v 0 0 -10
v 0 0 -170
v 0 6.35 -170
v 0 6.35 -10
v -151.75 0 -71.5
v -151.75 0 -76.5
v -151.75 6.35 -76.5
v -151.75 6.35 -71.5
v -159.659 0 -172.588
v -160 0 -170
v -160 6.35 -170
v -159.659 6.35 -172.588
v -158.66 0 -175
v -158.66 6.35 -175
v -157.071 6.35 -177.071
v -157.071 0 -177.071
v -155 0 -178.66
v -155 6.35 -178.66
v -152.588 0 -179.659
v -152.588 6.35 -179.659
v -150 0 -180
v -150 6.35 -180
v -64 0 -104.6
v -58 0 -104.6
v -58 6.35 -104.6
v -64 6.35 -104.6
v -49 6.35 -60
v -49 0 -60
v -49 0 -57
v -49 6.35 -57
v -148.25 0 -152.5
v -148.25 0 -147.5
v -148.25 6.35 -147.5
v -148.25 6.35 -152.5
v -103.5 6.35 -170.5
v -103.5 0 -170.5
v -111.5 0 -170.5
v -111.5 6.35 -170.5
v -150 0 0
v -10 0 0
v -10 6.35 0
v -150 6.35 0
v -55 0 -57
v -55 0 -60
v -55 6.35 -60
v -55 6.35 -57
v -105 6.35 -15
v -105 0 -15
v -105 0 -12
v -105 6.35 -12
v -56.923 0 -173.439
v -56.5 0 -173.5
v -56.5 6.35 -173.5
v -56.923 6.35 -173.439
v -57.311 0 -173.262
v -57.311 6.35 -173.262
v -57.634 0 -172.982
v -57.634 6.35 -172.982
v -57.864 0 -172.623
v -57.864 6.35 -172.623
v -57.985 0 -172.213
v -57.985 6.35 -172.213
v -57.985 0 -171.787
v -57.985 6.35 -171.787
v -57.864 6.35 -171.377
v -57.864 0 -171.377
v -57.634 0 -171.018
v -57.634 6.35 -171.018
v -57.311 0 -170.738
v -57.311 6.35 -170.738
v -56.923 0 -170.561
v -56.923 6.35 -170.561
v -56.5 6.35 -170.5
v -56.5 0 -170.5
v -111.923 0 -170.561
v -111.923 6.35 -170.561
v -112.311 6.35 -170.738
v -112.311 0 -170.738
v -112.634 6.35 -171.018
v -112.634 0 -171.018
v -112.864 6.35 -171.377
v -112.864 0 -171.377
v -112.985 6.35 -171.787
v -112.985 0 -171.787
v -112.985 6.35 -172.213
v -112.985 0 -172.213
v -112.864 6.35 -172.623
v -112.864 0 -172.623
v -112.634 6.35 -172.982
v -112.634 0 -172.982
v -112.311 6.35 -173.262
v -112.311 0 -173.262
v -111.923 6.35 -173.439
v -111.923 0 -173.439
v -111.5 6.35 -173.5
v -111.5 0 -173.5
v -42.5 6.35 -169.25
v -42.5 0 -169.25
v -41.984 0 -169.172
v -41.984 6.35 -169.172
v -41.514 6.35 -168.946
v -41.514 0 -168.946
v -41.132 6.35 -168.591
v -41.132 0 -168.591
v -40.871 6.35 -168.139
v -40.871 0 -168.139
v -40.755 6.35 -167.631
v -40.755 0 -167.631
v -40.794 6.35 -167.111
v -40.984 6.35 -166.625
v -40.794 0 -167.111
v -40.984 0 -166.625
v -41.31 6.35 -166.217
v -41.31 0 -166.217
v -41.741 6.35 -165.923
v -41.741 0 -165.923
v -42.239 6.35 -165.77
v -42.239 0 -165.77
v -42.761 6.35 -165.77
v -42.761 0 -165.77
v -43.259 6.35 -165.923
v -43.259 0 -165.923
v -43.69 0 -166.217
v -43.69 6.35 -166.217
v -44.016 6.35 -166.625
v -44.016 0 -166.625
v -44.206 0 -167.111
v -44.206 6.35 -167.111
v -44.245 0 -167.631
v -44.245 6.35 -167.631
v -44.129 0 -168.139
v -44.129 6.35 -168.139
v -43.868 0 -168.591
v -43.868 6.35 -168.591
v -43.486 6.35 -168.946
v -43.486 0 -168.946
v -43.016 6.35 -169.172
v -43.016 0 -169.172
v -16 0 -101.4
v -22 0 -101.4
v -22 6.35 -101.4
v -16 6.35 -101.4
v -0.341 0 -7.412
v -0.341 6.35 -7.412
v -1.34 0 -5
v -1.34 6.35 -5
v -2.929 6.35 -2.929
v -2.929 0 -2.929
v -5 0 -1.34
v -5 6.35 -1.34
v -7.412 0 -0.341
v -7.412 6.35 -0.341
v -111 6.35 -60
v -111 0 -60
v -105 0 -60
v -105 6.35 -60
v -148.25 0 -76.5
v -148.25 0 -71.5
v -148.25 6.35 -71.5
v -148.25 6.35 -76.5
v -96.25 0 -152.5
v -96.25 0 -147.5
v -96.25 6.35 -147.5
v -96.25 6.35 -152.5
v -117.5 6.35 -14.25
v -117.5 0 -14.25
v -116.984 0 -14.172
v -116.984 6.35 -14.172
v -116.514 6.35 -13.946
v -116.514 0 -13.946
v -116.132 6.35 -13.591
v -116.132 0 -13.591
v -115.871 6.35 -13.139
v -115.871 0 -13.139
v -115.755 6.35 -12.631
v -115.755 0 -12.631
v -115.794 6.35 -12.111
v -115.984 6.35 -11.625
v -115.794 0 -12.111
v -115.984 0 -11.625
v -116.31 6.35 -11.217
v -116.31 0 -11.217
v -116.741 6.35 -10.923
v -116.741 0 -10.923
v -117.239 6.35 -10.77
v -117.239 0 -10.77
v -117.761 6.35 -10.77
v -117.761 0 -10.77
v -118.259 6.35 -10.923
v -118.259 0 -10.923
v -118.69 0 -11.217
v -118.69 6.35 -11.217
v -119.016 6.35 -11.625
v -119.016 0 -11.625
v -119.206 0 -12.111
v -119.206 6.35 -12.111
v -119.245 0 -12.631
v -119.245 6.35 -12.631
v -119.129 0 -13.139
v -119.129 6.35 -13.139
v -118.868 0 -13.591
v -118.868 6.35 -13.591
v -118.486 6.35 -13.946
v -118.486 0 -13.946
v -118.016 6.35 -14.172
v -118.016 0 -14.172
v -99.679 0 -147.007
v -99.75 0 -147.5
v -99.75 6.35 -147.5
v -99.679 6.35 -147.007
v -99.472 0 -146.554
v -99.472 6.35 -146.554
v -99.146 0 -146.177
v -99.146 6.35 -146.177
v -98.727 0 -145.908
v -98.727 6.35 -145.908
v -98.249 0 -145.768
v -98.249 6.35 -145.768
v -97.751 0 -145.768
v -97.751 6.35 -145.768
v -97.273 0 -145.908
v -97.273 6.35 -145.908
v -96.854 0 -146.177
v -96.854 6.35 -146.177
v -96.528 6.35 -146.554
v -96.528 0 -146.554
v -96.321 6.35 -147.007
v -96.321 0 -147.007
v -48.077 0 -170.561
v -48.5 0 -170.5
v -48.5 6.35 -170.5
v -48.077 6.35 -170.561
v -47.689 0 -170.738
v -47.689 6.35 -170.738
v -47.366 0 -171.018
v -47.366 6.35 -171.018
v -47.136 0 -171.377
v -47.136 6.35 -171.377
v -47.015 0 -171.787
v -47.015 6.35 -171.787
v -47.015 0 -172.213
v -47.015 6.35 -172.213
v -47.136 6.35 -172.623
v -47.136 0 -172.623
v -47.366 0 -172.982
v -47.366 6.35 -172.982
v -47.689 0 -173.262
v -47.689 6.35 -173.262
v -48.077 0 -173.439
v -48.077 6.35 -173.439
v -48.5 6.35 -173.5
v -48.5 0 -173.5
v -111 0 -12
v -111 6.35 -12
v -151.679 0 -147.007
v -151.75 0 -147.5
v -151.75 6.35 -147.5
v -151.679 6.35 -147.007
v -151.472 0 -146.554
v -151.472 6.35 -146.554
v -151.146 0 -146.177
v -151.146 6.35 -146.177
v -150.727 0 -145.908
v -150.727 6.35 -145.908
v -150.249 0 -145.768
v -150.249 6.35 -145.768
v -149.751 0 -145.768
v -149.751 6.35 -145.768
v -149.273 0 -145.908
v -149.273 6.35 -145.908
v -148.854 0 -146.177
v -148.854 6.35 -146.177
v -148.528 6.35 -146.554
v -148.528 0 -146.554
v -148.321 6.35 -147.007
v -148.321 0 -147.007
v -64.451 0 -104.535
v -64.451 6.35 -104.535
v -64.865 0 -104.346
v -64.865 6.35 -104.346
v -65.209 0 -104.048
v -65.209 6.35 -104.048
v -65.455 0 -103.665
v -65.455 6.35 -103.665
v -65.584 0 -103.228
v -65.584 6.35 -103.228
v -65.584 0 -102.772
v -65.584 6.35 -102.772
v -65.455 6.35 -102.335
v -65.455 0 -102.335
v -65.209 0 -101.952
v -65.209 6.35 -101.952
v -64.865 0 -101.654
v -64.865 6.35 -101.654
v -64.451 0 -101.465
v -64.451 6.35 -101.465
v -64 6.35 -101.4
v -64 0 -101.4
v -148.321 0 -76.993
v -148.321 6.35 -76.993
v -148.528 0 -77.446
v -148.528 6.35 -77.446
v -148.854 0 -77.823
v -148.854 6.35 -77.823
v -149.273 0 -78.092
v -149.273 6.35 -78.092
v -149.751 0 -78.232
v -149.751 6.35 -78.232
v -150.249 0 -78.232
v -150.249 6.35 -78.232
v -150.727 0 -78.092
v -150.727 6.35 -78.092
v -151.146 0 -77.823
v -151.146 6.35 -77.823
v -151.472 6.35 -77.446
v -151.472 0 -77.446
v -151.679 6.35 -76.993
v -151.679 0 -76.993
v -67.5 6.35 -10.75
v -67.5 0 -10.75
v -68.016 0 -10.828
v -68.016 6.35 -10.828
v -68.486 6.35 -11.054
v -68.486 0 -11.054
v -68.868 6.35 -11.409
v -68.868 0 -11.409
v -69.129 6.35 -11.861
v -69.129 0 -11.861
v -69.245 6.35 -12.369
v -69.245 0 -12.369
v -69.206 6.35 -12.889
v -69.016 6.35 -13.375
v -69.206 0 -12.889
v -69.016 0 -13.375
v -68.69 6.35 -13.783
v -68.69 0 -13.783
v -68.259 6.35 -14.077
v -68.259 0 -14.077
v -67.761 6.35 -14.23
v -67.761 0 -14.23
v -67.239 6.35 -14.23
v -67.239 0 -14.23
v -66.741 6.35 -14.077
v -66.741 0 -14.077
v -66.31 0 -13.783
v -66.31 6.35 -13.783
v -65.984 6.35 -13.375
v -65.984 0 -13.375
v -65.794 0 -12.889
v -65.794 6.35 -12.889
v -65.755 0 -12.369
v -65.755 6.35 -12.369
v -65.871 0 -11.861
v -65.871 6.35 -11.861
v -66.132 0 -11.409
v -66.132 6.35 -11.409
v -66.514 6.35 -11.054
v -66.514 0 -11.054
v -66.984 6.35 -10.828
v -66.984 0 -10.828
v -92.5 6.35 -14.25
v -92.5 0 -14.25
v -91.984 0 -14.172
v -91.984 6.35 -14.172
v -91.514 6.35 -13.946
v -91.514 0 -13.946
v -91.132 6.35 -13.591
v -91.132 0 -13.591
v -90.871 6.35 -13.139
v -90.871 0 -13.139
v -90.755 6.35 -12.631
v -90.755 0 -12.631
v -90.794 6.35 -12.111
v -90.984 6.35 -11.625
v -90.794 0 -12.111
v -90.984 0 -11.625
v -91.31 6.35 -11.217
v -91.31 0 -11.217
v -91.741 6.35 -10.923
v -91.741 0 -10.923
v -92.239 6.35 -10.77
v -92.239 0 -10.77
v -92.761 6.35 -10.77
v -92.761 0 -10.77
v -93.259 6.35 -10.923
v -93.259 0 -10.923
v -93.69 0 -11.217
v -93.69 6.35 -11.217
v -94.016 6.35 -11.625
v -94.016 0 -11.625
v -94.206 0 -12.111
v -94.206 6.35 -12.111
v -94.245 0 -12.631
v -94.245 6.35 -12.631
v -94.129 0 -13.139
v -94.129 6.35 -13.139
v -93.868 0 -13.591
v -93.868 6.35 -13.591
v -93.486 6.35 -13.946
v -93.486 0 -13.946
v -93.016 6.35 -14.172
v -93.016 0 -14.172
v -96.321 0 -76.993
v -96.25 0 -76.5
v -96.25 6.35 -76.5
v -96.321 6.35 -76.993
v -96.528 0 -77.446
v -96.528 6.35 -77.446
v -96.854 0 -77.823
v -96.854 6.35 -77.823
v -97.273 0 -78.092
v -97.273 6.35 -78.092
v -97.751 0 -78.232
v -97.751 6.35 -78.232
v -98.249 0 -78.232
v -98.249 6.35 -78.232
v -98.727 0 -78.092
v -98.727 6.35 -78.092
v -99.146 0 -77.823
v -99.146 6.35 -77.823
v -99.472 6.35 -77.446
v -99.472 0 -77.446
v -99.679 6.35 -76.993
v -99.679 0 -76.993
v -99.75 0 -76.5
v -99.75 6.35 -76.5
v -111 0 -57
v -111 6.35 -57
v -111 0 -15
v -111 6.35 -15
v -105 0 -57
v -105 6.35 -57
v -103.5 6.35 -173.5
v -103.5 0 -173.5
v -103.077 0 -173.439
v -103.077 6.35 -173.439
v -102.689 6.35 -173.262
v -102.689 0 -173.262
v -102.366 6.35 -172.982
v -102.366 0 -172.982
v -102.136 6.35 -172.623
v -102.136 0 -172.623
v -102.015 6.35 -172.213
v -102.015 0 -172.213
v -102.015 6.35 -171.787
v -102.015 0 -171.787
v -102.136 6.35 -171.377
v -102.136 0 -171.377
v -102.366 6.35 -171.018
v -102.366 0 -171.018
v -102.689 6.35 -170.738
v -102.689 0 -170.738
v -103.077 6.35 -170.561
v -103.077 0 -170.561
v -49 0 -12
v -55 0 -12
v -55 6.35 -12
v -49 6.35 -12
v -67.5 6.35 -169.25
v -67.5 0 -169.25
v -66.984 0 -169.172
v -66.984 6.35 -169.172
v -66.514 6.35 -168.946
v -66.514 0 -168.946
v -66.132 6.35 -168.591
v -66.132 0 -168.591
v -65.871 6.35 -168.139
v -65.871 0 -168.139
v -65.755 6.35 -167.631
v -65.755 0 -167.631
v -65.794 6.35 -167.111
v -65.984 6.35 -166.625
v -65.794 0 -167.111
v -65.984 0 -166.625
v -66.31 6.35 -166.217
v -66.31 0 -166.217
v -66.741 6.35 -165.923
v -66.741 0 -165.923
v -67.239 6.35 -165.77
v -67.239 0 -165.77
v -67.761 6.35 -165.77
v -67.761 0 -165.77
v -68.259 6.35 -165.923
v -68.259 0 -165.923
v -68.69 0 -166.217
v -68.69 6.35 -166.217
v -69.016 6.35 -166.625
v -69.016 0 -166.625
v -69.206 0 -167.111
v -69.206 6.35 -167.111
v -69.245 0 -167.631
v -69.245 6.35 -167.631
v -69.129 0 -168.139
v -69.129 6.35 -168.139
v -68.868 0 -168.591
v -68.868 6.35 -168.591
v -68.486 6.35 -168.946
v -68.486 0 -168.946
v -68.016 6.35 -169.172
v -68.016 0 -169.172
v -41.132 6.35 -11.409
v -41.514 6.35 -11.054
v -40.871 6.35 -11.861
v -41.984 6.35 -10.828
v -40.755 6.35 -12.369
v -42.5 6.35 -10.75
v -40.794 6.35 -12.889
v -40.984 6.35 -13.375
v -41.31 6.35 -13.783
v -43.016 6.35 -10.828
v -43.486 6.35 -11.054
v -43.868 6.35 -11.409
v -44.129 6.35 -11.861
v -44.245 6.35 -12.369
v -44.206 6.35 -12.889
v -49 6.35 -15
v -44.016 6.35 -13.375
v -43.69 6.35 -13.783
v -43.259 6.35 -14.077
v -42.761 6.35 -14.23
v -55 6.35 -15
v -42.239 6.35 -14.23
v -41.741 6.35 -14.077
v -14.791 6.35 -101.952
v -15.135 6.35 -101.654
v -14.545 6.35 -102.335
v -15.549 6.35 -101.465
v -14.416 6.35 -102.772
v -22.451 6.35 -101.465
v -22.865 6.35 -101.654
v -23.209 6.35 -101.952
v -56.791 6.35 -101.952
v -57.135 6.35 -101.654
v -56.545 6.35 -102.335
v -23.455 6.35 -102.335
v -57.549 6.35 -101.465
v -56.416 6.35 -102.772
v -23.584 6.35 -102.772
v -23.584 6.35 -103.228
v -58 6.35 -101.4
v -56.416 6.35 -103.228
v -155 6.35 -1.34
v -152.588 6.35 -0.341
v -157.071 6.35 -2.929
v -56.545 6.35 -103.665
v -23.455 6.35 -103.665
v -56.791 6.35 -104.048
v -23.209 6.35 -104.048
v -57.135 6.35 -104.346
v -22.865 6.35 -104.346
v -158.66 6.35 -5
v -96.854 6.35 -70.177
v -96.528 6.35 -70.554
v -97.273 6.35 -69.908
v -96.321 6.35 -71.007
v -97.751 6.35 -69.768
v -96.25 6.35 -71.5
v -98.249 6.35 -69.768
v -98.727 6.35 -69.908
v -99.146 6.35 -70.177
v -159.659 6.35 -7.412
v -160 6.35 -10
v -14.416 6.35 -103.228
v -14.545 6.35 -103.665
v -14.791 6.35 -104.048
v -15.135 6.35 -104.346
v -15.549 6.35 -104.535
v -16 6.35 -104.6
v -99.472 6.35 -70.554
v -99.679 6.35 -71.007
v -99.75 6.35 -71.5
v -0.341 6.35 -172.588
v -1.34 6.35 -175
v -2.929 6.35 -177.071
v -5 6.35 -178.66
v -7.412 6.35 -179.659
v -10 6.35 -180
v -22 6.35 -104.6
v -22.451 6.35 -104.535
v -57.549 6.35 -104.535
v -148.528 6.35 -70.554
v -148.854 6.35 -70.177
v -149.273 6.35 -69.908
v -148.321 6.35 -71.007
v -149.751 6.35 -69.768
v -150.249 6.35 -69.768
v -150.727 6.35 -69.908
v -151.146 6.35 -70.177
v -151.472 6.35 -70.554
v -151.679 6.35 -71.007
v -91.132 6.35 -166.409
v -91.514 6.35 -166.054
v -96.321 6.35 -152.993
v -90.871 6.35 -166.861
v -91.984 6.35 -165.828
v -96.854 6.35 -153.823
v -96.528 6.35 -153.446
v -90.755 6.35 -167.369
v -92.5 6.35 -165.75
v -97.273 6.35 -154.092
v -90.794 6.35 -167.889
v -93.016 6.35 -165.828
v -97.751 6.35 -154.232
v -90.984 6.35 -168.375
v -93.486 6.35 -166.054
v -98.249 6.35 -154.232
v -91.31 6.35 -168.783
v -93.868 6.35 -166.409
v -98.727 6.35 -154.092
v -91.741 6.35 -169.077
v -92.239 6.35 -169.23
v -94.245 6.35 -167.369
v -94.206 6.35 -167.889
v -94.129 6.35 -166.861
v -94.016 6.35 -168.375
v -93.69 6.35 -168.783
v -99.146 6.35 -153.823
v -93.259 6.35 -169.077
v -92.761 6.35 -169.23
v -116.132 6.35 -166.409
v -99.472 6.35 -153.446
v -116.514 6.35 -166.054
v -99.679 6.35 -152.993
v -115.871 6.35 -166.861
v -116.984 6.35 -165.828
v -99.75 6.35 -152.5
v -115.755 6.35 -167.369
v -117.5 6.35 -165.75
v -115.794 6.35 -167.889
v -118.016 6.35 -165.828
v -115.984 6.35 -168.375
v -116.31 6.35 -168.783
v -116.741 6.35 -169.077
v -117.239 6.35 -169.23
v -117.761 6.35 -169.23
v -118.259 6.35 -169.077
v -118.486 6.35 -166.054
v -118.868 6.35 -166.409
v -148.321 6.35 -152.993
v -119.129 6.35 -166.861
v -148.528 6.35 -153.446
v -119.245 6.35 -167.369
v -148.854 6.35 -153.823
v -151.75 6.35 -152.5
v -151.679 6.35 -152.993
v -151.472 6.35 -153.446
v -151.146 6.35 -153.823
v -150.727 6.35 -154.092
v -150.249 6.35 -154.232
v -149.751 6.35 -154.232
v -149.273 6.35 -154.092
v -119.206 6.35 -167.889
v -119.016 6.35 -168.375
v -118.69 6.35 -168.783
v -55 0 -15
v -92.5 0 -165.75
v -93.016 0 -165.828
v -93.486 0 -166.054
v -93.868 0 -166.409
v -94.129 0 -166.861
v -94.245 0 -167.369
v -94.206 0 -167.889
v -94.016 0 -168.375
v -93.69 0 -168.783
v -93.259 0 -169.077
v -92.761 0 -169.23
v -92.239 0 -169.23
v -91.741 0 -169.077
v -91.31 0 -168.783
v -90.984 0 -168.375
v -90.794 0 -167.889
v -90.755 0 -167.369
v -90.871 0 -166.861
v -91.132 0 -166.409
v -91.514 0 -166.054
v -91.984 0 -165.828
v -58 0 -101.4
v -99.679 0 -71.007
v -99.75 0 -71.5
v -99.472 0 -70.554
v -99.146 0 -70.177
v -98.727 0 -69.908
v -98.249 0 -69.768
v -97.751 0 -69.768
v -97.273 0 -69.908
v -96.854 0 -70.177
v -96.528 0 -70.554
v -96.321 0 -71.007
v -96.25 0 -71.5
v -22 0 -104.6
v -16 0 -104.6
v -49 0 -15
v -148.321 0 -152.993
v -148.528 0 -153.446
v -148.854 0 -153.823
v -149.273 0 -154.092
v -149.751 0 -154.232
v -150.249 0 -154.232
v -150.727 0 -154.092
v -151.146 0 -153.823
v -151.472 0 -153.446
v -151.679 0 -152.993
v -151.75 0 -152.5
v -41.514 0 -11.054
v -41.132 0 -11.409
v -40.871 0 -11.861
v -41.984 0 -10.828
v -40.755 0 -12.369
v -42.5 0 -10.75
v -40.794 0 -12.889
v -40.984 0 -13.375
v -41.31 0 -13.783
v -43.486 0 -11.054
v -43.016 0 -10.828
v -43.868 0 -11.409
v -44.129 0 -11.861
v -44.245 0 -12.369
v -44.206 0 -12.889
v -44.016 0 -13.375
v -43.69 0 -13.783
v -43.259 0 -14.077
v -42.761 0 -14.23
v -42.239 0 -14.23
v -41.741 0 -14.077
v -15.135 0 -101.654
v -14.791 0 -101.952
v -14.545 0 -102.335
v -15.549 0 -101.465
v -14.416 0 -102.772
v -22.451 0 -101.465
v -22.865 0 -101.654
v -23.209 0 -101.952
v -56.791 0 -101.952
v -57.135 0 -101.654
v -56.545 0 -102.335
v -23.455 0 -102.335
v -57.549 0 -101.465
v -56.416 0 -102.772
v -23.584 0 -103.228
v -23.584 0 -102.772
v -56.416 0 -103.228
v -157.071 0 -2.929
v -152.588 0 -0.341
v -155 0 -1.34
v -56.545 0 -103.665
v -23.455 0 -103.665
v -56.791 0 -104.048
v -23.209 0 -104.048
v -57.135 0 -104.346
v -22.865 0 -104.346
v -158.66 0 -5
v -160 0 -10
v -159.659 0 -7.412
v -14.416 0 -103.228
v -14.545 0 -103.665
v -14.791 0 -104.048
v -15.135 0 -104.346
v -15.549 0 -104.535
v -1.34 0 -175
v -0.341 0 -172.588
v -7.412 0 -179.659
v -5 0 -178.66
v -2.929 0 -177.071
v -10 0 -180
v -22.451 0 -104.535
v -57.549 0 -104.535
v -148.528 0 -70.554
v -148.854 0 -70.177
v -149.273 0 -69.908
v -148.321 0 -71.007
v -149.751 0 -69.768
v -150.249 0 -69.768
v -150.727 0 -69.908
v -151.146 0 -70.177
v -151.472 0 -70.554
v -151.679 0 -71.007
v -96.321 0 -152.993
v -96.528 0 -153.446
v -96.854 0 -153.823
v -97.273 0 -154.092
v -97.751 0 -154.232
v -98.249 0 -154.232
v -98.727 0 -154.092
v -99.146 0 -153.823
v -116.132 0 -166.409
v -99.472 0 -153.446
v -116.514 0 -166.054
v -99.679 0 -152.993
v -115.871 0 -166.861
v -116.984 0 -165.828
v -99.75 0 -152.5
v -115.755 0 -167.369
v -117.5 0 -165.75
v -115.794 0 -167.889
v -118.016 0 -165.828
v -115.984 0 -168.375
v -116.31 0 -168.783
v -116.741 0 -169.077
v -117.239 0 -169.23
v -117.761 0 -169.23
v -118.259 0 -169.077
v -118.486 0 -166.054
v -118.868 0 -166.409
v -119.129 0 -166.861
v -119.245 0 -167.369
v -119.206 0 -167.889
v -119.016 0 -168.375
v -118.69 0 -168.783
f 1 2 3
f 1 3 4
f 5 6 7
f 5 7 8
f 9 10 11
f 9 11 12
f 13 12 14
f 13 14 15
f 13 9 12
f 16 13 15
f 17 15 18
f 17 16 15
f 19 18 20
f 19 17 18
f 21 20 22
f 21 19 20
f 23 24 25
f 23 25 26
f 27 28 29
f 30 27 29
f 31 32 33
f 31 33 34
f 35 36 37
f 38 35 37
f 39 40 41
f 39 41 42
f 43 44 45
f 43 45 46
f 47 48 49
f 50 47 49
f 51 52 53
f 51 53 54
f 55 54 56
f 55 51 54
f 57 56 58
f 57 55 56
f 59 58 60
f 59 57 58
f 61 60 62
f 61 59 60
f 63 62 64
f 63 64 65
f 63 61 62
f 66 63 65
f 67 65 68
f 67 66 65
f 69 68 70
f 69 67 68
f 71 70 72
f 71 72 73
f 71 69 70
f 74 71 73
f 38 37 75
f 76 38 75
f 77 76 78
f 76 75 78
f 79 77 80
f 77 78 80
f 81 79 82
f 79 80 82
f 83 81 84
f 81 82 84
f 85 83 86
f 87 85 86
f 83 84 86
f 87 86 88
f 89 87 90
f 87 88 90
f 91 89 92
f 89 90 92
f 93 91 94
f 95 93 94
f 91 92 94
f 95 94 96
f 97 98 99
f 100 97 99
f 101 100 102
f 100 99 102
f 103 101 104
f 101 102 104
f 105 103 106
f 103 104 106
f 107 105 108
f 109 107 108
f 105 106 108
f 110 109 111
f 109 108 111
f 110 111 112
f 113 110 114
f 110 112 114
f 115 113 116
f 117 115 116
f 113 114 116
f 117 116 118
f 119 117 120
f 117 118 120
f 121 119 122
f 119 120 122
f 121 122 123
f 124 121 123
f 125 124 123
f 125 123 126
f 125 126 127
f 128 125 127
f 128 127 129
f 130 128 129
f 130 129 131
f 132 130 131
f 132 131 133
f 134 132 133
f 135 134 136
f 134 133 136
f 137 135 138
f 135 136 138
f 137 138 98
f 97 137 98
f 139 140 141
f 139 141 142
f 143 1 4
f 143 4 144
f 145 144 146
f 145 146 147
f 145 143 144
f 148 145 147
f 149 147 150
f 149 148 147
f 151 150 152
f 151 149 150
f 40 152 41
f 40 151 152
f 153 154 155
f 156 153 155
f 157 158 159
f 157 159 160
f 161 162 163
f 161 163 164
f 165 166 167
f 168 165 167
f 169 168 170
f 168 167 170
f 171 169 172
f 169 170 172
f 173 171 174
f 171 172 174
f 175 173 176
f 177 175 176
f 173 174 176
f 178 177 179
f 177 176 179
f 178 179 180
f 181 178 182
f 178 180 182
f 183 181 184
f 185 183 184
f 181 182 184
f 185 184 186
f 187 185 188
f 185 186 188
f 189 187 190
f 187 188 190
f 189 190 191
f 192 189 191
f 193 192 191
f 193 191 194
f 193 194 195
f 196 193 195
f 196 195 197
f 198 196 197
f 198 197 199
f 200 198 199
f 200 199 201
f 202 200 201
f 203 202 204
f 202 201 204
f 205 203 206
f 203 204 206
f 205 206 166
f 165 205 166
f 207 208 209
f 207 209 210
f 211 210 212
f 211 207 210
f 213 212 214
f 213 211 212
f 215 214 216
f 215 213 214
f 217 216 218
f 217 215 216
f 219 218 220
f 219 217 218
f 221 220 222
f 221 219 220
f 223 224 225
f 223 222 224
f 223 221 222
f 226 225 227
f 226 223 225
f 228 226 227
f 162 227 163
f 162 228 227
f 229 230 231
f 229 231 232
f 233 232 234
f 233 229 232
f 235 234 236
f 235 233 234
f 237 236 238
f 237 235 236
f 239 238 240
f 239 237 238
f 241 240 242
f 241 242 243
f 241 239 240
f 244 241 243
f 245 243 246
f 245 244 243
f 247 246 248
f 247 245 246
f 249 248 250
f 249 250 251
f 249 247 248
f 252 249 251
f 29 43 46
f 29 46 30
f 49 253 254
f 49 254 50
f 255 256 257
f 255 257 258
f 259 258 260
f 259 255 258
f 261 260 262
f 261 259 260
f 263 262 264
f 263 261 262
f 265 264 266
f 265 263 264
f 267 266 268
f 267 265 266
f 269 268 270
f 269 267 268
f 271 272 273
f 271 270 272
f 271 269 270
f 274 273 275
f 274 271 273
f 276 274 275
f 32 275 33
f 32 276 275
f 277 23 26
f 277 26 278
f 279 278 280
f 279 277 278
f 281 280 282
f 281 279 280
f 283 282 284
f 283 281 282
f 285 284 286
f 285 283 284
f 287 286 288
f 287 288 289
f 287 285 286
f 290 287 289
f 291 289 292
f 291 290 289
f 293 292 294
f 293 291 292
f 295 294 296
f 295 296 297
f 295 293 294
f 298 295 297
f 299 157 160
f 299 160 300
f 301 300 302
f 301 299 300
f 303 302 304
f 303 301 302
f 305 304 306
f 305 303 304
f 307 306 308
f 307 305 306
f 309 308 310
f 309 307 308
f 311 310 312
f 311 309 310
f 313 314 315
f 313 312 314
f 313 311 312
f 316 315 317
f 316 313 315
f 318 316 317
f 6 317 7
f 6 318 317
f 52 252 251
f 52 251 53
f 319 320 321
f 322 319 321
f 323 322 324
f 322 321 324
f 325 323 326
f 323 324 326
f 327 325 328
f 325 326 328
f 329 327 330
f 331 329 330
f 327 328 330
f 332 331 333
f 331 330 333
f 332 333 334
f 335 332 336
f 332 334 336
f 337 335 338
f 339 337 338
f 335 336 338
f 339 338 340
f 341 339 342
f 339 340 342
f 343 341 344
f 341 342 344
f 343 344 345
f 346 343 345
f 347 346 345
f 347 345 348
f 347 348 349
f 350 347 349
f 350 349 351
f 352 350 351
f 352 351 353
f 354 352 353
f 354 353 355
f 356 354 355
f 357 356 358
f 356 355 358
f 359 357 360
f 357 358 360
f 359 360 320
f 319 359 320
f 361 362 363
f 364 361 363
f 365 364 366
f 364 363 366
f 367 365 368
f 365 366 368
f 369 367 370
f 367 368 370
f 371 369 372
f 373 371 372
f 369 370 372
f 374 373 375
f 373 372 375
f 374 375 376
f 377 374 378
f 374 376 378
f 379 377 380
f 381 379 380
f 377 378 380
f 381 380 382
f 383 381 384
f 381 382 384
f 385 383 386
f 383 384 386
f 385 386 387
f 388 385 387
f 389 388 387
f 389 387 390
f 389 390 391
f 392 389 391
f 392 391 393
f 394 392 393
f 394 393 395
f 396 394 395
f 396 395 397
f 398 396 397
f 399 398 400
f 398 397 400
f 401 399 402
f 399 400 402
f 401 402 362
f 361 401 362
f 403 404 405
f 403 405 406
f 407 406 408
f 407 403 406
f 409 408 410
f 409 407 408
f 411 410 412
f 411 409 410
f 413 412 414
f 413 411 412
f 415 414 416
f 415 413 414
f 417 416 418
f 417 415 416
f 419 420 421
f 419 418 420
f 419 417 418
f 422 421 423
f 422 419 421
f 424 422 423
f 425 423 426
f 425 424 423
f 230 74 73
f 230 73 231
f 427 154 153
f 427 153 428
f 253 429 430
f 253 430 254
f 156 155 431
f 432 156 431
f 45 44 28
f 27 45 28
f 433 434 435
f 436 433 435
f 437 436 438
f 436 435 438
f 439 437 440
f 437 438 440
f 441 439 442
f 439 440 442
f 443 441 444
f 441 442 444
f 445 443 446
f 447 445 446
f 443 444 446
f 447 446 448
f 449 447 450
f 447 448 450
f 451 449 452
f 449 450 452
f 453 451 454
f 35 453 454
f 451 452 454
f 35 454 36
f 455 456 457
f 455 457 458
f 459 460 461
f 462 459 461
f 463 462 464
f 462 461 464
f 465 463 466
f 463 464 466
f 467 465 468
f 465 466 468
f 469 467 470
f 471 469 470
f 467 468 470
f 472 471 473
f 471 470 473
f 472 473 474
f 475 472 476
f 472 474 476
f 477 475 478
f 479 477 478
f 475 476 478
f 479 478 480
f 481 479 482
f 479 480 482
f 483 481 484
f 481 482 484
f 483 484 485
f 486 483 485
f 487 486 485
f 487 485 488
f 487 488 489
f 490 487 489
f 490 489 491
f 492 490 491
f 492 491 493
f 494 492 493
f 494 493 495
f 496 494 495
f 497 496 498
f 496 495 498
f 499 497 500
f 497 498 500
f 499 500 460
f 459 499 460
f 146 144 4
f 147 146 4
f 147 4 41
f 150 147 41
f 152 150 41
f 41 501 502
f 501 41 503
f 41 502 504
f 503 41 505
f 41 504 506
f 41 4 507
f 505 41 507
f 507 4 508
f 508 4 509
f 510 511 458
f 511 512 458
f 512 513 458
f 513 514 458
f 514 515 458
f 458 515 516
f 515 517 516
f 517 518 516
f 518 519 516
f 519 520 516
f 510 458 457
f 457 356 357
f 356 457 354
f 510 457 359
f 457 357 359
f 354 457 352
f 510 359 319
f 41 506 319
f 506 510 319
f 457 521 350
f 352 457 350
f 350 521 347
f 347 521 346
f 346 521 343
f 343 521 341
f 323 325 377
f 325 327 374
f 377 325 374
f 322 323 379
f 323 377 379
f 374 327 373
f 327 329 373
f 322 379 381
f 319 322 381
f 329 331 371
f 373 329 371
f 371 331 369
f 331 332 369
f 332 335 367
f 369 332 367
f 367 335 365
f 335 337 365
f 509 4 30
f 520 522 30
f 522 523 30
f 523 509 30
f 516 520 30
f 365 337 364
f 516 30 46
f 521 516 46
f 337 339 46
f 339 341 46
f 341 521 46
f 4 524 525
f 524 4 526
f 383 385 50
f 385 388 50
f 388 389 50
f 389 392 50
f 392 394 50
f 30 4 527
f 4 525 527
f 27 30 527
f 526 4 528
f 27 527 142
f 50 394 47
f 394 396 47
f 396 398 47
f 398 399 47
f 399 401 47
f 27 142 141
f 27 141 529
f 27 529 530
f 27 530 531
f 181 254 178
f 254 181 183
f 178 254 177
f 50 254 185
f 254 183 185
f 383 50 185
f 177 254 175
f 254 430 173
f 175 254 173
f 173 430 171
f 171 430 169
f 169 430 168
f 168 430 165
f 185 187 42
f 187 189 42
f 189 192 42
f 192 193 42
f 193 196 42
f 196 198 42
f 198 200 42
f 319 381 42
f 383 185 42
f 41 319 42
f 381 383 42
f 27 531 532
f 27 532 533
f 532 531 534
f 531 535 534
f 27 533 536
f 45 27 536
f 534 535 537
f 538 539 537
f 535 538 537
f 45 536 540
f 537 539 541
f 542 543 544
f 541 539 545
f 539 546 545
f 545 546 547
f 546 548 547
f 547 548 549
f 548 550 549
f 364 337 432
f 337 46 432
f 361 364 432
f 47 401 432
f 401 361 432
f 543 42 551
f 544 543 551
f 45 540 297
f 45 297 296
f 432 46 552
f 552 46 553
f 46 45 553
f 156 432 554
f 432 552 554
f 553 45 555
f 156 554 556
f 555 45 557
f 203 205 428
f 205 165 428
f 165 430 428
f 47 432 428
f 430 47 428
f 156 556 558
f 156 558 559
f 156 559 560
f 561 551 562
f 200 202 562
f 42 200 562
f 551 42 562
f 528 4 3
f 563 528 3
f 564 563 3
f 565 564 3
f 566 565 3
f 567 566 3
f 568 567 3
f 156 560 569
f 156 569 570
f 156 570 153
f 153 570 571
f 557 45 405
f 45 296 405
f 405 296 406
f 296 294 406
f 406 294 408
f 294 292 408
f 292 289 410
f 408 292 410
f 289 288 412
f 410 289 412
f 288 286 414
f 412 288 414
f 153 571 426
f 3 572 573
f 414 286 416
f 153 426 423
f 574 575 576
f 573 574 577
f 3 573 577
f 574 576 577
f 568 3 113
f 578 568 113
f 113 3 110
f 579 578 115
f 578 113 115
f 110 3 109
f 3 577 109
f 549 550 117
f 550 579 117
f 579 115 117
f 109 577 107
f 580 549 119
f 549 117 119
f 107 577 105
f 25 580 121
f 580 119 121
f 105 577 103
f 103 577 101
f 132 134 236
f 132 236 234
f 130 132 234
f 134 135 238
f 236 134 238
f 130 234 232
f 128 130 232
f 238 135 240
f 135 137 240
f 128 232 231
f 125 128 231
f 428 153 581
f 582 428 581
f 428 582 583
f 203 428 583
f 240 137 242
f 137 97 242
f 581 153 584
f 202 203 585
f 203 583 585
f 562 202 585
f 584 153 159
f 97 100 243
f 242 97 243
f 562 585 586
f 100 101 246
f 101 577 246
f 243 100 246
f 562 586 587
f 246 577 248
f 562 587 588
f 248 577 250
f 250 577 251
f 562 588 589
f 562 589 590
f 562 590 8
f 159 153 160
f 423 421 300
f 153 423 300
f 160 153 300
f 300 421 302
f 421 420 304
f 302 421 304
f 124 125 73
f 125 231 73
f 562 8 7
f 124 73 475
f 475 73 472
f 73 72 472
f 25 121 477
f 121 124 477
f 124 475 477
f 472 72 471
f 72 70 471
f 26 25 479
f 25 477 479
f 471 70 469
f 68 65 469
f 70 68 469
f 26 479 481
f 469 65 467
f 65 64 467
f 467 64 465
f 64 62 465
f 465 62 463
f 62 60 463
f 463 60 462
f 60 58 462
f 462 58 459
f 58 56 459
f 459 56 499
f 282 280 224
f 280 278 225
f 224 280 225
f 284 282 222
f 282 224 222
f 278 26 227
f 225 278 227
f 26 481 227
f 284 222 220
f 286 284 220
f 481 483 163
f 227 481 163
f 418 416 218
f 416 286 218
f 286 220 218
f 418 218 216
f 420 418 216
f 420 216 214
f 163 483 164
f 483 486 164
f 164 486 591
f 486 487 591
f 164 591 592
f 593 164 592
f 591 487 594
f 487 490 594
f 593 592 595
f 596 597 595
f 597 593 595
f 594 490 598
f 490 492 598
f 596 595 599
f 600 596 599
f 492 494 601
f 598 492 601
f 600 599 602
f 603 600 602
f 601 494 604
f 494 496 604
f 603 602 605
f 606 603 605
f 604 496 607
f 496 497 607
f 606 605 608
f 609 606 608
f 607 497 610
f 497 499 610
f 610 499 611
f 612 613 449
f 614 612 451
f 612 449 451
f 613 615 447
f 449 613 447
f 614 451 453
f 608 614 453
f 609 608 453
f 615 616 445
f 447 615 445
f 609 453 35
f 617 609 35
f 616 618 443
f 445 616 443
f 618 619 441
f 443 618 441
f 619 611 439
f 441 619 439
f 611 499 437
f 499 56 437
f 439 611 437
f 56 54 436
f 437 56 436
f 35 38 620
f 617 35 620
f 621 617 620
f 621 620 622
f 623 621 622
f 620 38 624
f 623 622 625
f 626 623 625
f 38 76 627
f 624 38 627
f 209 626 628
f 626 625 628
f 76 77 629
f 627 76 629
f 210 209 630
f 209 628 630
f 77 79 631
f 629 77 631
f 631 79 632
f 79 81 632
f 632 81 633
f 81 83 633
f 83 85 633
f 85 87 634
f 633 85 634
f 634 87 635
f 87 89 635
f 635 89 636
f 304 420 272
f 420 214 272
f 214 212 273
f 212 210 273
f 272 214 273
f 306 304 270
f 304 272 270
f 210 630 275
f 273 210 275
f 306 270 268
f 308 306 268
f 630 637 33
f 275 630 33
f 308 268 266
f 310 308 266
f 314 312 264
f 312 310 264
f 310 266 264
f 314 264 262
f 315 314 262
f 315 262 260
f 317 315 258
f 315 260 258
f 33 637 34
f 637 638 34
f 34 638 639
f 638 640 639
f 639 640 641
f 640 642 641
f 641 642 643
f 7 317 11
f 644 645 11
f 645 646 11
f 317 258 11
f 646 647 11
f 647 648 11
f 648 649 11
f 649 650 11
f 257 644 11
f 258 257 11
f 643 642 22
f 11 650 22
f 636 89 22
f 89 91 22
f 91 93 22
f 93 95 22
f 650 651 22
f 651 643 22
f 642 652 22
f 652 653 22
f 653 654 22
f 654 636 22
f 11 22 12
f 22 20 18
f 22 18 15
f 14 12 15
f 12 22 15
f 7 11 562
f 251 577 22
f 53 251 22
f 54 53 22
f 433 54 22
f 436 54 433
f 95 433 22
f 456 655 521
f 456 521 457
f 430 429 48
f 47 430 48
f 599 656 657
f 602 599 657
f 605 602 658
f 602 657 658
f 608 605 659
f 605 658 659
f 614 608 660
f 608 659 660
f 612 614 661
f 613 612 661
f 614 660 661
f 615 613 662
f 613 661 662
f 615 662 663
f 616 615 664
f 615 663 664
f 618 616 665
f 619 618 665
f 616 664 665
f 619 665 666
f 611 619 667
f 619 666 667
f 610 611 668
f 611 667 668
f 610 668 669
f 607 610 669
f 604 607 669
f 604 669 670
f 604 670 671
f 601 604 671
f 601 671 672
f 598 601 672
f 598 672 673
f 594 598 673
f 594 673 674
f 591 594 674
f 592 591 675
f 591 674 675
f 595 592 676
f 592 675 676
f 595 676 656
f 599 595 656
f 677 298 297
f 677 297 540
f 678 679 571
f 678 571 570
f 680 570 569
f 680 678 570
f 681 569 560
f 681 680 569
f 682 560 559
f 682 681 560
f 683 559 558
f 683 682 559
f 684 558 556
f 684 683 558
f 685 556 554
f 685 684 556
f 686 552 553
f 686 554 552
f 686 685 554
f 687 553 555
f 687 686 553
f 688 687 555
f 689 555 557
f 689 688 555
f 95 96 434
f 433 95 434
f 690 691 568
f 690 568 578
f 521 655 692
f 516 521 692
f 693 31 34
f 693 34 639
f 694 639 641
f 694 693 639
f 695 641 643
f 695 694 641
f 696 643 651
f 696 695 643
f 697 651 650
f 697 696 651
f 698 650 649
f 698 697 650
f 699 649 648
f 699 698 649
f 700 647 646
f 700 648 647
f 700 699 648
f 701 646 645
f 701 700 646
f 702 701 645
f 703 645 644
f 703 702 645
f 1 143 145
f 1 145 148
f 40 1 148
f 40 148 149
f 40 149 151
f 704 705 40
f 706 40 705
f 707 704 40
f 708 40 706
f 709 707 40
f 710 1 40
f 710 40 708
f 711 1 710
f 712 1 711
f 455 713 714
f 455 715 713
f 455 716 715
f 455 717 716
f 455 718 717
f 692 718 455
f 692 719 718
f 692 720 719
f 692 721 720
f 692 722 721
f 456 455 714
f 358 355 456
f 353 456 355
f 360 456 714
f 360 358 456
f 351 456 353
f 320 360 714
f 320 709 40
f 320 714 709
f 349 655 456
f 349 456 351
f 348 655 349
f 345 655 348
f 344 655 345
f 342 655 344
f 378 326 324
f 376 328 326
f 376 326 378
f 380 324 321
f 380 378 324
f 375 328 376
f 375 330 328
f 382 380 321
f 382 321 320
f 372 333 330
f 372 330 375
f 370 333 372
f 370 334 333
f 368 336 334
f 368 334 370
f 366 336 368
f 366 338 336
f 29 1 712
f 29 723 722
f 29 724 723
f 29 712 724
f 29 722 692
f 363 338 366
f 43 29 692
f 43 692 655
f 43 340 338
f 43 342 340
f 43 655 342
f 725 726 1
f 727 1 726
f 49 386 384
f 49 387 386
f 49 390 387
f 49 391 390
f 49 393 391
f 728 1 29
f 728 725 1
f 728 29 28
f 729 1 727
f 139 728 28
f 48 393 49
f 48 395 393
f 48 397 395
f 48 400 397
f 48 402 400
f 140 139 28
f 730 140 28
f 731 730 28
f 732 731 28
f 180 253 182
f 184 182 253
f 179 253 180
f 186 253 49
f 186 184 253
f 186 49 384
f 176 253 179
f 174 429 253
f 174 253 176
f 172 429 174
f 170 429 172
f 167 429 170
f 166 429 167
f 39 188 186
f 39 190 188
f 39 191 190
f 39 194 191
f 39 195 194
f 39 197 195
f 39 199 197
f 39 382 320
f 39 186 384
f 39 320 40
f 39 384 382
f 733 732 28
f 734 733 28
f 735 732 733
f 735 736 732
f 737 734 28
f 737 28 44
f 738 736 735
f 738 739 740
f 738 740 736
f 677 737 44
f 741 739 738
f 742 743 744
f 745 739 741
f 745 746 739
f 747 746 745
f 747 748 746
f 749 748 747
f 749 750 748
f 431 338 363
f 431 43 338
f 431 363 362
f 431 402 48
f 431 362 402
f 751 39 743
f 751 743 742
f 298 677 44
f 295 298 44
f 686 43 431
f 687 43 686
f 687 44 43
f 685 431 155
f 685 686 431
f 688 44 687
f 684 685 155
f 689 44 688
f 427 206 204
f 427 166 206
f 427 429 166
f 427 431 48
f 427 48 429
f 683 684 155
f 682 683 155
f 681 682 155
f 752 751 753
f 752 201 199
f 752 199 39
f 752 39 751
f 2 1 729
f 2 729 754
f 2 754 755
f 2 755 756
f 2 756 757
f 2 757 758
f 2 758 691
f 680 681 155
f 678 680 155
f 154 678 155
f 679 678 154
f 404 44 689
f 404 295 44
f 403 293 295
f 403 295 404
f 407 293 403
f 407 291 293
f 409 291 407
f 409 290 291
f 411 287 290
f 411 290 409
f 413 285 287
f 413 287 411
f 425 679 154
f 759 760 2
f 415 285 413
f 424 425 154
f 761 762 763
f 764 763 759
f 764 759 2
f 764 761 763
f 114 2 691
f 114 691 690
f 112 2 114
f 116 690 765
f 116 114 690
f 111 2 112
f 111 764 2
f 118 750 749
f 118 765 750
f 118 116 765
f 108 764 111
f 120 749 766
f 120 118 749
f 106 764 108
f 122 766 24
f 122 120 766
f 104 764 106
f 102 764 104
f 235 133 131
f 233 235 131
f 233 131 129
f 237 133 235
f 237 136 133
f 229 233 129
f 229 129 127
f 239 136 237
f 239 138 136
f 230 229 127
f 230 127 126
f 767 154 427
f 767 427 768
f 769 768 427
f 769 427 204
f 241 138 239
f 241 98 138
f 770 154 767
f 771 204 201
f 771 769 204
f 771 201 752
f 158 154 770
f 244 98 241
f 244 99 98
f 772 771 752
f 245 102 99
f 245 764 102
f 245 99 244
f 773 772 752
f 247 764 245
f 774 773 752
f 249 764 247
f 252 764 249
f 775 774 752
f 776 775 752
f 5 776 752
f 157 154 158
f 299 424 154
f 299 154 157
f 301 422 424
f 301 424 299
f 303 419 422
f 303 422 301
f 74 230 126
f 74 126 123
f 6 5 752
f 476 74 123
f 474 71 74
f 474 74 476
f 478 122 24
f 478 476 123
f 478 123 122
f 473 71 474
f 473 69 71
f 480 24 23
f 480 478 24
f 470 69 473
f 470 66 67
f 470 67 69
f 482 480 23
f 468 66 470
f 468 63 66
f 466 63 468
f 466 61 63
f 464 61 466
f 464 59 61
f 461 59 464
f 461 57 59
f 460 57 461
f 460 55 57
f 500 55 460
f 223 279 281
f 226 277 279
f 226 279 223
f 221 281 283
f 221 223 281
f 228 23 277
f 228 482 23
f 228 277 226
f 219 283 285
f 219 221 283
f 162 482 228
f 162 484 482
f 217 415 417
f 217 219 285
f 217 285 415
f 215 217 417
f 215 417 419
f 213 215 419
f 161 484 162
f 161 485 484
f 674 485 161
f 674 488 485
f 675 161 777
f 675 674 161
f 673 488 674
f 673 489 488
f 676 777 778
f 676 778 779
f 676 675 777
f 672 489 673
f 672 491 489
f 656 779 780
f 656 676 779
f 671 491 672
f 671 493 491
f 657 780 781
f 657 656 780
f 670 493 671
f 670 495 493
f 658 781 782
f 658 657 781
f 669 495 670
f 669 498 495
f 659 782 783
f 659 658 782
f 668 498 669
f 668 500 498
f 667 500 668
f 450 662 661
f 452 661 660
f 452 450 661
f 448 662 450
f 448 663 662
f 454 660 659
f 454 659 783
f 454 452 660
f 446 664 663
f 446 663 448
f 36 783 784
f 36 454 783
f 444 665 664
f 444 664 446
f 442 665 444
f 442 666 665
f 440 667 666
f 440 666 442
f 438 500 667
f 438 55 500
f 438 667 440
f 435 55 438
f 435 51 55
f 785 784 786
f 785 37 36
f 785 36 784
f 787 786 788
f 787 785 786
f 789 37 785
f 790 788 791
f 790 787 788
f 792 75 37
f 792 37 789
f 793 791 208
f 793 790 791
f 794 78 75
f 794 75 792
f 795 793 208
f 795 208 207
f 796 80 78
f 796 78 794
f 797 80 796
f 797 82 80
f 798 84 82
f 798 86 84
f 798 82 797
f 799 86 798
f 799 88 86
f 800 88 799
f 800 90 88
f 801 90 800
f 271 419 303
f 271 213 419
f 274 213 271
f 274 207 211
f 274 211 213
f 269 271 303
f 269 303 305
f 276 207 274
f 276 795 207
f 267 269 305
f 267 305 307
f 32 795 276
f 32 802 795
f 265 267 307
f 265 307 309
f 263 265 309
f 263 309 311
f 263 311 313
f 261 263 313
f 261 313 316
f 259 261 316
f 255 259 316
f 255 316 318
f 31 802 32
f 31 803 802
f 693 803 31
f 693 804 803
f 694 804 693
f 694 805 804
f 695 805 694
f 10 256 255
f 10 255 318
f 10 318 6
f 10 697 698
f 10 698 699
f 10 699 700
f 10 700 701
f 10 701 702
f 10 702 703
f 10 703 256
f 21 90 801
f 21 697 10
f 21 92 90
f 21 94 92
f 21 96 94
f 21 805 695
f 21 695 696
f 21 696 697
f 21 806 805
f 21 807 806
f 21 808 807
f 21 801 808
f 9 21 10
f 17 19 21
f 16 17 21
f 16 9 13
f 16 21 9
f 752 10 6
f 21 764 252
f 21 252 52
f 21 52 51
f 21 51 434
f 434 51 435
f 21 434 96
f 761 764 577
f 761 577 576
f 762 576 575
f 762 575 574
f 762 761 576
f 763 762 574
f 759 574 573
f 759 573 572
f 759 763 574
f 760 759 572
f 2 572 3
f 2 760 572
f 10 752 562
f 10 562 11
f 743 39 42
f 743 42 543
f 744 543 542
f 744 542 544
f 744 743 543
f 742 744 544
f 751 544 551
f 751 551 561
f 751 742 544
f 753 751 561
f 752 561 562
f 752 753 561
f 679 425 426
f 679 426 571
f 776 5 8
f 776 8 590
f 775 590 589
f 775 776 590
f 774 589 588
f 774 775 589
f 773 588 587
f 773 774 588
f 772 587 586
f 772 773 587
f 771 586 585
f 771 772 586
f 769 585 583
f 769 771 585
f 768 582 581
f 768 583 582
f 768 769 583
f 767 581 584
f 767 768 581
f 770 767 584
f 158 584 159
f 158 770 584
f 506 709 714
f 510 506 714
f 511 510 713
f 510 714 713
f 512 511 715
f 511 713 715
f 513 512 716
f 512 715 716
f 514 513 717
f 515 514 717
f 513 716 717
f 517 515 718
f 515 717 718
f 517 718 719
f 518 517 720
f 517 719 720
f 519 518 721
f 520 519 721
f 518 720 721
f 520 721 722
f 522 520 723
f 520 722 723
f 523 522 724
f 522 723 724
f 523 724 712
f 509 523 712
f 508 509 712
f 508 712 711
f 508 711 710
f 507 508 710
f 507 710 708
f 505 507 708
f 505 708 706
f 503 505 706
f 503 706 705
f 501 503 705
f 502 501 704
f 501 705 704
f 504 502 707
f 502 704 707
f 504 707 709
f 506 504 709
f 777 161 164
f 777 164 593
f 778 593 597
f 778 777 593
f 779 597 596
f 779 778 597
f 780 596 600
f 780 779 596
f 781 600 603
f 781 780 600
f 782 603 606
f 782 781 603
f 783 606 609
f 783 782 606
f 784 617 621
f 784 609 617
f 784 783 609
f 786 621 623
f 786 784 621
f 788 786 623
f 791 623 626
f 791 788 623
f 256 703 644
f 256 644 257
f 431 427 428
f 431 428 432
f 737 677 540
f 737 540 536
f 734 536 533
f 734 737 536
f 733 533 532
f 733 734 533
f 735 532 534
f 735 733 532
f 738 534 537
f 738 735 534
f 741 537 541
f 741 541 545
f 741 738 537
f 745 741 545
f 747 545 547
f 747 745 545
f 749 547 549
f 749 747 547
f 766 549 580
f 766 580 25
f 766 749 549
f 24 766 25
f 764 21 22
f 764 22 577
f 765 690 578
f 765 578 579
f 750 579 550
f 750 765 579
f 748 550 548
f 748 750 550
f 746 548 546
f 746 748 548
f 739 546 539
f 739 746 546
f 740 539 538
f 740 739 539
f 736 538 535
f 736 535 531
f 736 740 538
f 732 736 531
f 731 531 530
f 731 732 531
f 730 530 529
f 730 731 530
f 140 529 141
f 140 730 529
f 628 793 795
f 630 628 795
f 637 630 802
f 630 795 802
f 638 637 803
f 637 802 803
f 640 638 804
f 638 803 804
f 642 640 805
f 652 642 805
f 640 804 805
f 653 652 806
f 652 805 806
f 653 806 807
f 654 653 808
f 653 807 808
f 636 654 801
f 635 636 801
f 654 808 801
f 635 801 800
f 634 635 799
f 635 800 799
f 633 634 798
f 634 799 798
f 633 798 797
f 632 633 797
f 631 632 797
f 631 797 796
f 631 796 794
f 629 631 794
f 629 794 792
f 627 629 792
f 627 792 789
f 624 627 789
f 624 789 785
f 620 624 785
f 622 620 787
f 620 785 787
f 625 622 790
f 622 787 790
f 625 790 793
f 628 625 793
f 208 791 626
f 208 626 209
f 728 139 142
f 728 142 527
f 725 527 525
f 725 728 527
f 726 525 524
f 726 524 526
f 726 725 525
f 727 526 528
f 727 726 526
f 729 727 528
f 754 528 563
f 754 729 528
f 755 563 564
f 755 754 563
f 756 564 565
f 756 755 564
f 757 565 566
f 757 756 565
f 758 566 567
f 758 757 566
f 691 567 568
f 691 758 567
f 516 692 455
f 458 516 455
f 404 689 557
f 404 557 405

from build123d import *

# Parameters (mm, degrees)
MAIN_DEPTH   = 6.35
ODROID_REACH = 242.916
REG_DEPTH    = 6.35
SKETCH10_W   = 6
SKETCH10_H   = 3
BAT_DEPTH    = 6.35
SKETCH11_R   = 1.75
MOUNT_DEPTH  = 6.35
CAMERA_DEPTH = 6.35


with BuildPart() as part:
    # Sketch1 → main (new body)
    with BuildSketch(Plane(origin=(0, 0, 0), x_dir=(1, 0, 0), z_dir=(0, 1, 0))):
        with BuildLine():
            Line((-10, 0), (-150, 0))
            ThreePointArc((-150, 0), (-157.071067812, 2.928932188), (-160, 10))
            Line((-160, 10), (-160, 170))
            ThreePointArc((-160, 170), (-157.071067812, 177.071067812), (-150, 180))
            Line((-150, 180), (-10, 180))
            ThreePointArc((-10, 180), (-2.928932188, 177.071067812), (0, 170))
            Line((0, 170), (0, 10))
            ThreePointArc((0, 10), (-2.928932188, 2.928932188), (-10, 0))
        make_face()
    extrude(amount=MAIN_DEPTH)

    # Sketch8 → odroid (cut, up to next)
    with BuildSketch(Plane.XZ, mode=Mode.PRIVATE) as odroid_sk1:
        with BuildLine():
            Line((-96.25, -147.5), (-96.25, -152.5))
            ThreePointArc((-96.25, -152.5), (-98, -154.25), (-99.75, -152.5))
            Line((-99.75, -152.5), (-99.75, -147.5))
            ThreePointArc((-99.75, -147.5), (-98, -145.75), (-96.25, -147.5))
        make_face()
    odroid_tool1 = extrude(odroid_sk1.sketch, amount=-ODROID_REACH, mode=Mode.PRIVATE) & part.part
    # Sketch8 → odroid (cut, up to next)
    with BuildSketch(Plane.XZ, mode=Mode.PRIVATE) as odroid_sk2:
        with BuildLine():
            Line((-96.25, -71.5), (-96.25, -76.5))
            ThreePointArc((-96.25, -76.5), (-98, -78.25), (-99.75, -76.5))
            Line((-99.75, -76.5), (-99.75, -71.5))
            ThreePointArc((-99.75, -71.5), (-98, -69.75), (-96.25, -71.5))
        make_face()
    odroid_tool2 = extrude(odroid_sk2.sketch, amount=-ODROID_REACH, mode=Mode.PRIVATE) & part.part
    # Sketch8 → odroid (cut, up to next)
    with BuildSketch(Plane.XZ, mode=Mode.PRIVATE) as odroid_sk3:
        with BuildLine():
            Line((-148.25, -147.5), (-148.25, -152.5))
            ThreePointArc((-148.25, -152.5), (-150, -154.25), (-151.75, -152.5))
            Line((-151.75, -152.5), (-151.75, -147.5))
            ThreePointArc((-151.75, -147.5), (-150, -145.75), (-148.25, -147.5))
        make_face()
    odroid_tool3 = extrude(odroid_sk3.sketch, amount=-ODROID_REACH, mode=Mode.PRIVATE) & part.part
    # Sketch8 → odroid (cut, up to next)
    with BuildSketch(Plane.XZ, mode=Mode.PRIVATE) as odroid_sk4:
        with BuildLine():
            Line((-148.25, -71.5), (-148.25, -76.5))
            ThreePointArc((-148.25, -76.5), (-150, -78.25), (-151.75, -76.5))
            Line((-151.75, -76.5), (-151.75, -71.5))
            ThreePointArc((-151.75, -71.5), (-150, -69.75), (-148.25, -71.5))
        make_face()
    odroid_tool4 = extrude(odroid_sk4.sketch, amount=-ODROID_REACH, mode=Mode.PRIVATE) & part.part
    add(odroid_tool1.solids().sort_by_distance((-98, 0, -150))[0], mode=Mode.SUBTRACT)
    add(odroid_tool2.solids().sort_by_distance((-98, 0, -74))[0], mode=Mode.SUBTRACT)
    add(odroid_tool3.solids().sort_by_distance((-150, 0, -150))[0], mode=Mode.SUBTRACT)
    add(odroid_tool4.solids().sort_by_distance((-150, 0, -74))[0], mode=Mode.SUBTRACT)

    # Sketch9 → reg (cut)
    with BuildSketch(Plane.XZ):
        with BuildLine():
            Line((-58, -104.6), (-64, -104.6))
            ThreePointArc((-64, -104.6), (-65.6, -103), (-64, -101.4))
            Line((-64, -101.4), (-58, -101.4))
            ThreePointArc((-58, -101.4), (-56.4, -103), (-58, -104.6))
        make_face()
        with BuildLine():
            Line((-16, -104.6), (-22, -104.6))
            ThreePointArc((-22, -104.6), (-23.6, -103), (-22, -101.4))
            Line((-22, -101.4), (-16, -101.4))
            ThreePointArc((-16, -101.4), (-14.4, -103), (-16, -104.6))
        make_face()
    extrude(amount=-REG_DEPTH, mode=Mode.SUBTRACT)

    # Sketch10 → bat (cut)
    with BuildSketch(Plane.XZ):
        with Locations((-52, -58.5)):
            Rectangle(SKETCH10_W, SKETCH10_H)
        with Locations((-108, -13.5)):
            Rectangle(SKETCH10_W, SKETCH10_H)
        with Locations((-108, -58.5)):
            Rectangle(SKETCH10_W, SKETCH10_H)
        with Locations((-52, -13.5)):
            Rectangle(SKETCH10_W, SKETCH10_H)
    extrude(amount=-BAT_DEPTH, mode=Mode.SUBTRACT)

    # Sketch11 → mount (cut)
    with BuildSketch(Plane.XZ):
        with Locations(Location((-67.5, -167.5, 0), (0, 0, 270))):
            Circle(SKETCH11_R)
        with Locations(Location((-42.5, -167.5, 0), (0, 0, 270))):
            Circle(SKETCH11_R)
        with Locations(Location((-117.5, -12.5, 0), (0, 0, 270))):
            Circle(SKETCH11_R)
        with Locations(Location((-92.5, -167.5, 0), (0, 0, 90))):
            Circle(SKETCH11_R)
        with Locations(Location((-92.5, -12.5, 0), (0, 0, 270))):
            Circle(SKETCH11_R)
        with Locations(Location((-42.5, -12.5, 0), (0, 0, 90))):
            Circle(SKETCH11_R)
        with Locations(Location((-67.5, -12.5, 0), (0, 0, 90))):
            Circle(SKETCH11_R)
        with Locations(Location((-117.5, -167.5, 0), (0, 0, 90))):
            Circle(SKETCH11_R)
    extrude(amount=-MOUNT_DEPTH, mode=Mode.SUBTRACT)

    # Sketch12 → camera (cut)
    with BuildSketch(Plane.XZ):
        with BuildLine():
            Line((-48.5, -173.5), (-56.5, -173.5))
            ThreePointArc((-56.5, -173.5), (-58, -172), (-56.5, -170.5))
            Line((-56.5, -170.5), (-48.5, -170.5))
            ThreePointArc((-48.5, -170.5), (-47, -172), (-48.5, -173.5))
        make_face()
        with BuildLine():
            Line((-111.5, -173.5), (-103.5, -173.5))
            ThreePointArc((-103.5, -173.5), (-102, -172), (-103.5, -170.5))
            Line((-103.5, -170.5), (-111.5, -170.5))
            ThreePointArc((-111.5, -170.5), (-113, -172), (-111.5, -173.5))
        make_face()
    extrude(amount=-CAMERA_DEPTH, mode=Mode.SUBTRACT)


solid = part.part
